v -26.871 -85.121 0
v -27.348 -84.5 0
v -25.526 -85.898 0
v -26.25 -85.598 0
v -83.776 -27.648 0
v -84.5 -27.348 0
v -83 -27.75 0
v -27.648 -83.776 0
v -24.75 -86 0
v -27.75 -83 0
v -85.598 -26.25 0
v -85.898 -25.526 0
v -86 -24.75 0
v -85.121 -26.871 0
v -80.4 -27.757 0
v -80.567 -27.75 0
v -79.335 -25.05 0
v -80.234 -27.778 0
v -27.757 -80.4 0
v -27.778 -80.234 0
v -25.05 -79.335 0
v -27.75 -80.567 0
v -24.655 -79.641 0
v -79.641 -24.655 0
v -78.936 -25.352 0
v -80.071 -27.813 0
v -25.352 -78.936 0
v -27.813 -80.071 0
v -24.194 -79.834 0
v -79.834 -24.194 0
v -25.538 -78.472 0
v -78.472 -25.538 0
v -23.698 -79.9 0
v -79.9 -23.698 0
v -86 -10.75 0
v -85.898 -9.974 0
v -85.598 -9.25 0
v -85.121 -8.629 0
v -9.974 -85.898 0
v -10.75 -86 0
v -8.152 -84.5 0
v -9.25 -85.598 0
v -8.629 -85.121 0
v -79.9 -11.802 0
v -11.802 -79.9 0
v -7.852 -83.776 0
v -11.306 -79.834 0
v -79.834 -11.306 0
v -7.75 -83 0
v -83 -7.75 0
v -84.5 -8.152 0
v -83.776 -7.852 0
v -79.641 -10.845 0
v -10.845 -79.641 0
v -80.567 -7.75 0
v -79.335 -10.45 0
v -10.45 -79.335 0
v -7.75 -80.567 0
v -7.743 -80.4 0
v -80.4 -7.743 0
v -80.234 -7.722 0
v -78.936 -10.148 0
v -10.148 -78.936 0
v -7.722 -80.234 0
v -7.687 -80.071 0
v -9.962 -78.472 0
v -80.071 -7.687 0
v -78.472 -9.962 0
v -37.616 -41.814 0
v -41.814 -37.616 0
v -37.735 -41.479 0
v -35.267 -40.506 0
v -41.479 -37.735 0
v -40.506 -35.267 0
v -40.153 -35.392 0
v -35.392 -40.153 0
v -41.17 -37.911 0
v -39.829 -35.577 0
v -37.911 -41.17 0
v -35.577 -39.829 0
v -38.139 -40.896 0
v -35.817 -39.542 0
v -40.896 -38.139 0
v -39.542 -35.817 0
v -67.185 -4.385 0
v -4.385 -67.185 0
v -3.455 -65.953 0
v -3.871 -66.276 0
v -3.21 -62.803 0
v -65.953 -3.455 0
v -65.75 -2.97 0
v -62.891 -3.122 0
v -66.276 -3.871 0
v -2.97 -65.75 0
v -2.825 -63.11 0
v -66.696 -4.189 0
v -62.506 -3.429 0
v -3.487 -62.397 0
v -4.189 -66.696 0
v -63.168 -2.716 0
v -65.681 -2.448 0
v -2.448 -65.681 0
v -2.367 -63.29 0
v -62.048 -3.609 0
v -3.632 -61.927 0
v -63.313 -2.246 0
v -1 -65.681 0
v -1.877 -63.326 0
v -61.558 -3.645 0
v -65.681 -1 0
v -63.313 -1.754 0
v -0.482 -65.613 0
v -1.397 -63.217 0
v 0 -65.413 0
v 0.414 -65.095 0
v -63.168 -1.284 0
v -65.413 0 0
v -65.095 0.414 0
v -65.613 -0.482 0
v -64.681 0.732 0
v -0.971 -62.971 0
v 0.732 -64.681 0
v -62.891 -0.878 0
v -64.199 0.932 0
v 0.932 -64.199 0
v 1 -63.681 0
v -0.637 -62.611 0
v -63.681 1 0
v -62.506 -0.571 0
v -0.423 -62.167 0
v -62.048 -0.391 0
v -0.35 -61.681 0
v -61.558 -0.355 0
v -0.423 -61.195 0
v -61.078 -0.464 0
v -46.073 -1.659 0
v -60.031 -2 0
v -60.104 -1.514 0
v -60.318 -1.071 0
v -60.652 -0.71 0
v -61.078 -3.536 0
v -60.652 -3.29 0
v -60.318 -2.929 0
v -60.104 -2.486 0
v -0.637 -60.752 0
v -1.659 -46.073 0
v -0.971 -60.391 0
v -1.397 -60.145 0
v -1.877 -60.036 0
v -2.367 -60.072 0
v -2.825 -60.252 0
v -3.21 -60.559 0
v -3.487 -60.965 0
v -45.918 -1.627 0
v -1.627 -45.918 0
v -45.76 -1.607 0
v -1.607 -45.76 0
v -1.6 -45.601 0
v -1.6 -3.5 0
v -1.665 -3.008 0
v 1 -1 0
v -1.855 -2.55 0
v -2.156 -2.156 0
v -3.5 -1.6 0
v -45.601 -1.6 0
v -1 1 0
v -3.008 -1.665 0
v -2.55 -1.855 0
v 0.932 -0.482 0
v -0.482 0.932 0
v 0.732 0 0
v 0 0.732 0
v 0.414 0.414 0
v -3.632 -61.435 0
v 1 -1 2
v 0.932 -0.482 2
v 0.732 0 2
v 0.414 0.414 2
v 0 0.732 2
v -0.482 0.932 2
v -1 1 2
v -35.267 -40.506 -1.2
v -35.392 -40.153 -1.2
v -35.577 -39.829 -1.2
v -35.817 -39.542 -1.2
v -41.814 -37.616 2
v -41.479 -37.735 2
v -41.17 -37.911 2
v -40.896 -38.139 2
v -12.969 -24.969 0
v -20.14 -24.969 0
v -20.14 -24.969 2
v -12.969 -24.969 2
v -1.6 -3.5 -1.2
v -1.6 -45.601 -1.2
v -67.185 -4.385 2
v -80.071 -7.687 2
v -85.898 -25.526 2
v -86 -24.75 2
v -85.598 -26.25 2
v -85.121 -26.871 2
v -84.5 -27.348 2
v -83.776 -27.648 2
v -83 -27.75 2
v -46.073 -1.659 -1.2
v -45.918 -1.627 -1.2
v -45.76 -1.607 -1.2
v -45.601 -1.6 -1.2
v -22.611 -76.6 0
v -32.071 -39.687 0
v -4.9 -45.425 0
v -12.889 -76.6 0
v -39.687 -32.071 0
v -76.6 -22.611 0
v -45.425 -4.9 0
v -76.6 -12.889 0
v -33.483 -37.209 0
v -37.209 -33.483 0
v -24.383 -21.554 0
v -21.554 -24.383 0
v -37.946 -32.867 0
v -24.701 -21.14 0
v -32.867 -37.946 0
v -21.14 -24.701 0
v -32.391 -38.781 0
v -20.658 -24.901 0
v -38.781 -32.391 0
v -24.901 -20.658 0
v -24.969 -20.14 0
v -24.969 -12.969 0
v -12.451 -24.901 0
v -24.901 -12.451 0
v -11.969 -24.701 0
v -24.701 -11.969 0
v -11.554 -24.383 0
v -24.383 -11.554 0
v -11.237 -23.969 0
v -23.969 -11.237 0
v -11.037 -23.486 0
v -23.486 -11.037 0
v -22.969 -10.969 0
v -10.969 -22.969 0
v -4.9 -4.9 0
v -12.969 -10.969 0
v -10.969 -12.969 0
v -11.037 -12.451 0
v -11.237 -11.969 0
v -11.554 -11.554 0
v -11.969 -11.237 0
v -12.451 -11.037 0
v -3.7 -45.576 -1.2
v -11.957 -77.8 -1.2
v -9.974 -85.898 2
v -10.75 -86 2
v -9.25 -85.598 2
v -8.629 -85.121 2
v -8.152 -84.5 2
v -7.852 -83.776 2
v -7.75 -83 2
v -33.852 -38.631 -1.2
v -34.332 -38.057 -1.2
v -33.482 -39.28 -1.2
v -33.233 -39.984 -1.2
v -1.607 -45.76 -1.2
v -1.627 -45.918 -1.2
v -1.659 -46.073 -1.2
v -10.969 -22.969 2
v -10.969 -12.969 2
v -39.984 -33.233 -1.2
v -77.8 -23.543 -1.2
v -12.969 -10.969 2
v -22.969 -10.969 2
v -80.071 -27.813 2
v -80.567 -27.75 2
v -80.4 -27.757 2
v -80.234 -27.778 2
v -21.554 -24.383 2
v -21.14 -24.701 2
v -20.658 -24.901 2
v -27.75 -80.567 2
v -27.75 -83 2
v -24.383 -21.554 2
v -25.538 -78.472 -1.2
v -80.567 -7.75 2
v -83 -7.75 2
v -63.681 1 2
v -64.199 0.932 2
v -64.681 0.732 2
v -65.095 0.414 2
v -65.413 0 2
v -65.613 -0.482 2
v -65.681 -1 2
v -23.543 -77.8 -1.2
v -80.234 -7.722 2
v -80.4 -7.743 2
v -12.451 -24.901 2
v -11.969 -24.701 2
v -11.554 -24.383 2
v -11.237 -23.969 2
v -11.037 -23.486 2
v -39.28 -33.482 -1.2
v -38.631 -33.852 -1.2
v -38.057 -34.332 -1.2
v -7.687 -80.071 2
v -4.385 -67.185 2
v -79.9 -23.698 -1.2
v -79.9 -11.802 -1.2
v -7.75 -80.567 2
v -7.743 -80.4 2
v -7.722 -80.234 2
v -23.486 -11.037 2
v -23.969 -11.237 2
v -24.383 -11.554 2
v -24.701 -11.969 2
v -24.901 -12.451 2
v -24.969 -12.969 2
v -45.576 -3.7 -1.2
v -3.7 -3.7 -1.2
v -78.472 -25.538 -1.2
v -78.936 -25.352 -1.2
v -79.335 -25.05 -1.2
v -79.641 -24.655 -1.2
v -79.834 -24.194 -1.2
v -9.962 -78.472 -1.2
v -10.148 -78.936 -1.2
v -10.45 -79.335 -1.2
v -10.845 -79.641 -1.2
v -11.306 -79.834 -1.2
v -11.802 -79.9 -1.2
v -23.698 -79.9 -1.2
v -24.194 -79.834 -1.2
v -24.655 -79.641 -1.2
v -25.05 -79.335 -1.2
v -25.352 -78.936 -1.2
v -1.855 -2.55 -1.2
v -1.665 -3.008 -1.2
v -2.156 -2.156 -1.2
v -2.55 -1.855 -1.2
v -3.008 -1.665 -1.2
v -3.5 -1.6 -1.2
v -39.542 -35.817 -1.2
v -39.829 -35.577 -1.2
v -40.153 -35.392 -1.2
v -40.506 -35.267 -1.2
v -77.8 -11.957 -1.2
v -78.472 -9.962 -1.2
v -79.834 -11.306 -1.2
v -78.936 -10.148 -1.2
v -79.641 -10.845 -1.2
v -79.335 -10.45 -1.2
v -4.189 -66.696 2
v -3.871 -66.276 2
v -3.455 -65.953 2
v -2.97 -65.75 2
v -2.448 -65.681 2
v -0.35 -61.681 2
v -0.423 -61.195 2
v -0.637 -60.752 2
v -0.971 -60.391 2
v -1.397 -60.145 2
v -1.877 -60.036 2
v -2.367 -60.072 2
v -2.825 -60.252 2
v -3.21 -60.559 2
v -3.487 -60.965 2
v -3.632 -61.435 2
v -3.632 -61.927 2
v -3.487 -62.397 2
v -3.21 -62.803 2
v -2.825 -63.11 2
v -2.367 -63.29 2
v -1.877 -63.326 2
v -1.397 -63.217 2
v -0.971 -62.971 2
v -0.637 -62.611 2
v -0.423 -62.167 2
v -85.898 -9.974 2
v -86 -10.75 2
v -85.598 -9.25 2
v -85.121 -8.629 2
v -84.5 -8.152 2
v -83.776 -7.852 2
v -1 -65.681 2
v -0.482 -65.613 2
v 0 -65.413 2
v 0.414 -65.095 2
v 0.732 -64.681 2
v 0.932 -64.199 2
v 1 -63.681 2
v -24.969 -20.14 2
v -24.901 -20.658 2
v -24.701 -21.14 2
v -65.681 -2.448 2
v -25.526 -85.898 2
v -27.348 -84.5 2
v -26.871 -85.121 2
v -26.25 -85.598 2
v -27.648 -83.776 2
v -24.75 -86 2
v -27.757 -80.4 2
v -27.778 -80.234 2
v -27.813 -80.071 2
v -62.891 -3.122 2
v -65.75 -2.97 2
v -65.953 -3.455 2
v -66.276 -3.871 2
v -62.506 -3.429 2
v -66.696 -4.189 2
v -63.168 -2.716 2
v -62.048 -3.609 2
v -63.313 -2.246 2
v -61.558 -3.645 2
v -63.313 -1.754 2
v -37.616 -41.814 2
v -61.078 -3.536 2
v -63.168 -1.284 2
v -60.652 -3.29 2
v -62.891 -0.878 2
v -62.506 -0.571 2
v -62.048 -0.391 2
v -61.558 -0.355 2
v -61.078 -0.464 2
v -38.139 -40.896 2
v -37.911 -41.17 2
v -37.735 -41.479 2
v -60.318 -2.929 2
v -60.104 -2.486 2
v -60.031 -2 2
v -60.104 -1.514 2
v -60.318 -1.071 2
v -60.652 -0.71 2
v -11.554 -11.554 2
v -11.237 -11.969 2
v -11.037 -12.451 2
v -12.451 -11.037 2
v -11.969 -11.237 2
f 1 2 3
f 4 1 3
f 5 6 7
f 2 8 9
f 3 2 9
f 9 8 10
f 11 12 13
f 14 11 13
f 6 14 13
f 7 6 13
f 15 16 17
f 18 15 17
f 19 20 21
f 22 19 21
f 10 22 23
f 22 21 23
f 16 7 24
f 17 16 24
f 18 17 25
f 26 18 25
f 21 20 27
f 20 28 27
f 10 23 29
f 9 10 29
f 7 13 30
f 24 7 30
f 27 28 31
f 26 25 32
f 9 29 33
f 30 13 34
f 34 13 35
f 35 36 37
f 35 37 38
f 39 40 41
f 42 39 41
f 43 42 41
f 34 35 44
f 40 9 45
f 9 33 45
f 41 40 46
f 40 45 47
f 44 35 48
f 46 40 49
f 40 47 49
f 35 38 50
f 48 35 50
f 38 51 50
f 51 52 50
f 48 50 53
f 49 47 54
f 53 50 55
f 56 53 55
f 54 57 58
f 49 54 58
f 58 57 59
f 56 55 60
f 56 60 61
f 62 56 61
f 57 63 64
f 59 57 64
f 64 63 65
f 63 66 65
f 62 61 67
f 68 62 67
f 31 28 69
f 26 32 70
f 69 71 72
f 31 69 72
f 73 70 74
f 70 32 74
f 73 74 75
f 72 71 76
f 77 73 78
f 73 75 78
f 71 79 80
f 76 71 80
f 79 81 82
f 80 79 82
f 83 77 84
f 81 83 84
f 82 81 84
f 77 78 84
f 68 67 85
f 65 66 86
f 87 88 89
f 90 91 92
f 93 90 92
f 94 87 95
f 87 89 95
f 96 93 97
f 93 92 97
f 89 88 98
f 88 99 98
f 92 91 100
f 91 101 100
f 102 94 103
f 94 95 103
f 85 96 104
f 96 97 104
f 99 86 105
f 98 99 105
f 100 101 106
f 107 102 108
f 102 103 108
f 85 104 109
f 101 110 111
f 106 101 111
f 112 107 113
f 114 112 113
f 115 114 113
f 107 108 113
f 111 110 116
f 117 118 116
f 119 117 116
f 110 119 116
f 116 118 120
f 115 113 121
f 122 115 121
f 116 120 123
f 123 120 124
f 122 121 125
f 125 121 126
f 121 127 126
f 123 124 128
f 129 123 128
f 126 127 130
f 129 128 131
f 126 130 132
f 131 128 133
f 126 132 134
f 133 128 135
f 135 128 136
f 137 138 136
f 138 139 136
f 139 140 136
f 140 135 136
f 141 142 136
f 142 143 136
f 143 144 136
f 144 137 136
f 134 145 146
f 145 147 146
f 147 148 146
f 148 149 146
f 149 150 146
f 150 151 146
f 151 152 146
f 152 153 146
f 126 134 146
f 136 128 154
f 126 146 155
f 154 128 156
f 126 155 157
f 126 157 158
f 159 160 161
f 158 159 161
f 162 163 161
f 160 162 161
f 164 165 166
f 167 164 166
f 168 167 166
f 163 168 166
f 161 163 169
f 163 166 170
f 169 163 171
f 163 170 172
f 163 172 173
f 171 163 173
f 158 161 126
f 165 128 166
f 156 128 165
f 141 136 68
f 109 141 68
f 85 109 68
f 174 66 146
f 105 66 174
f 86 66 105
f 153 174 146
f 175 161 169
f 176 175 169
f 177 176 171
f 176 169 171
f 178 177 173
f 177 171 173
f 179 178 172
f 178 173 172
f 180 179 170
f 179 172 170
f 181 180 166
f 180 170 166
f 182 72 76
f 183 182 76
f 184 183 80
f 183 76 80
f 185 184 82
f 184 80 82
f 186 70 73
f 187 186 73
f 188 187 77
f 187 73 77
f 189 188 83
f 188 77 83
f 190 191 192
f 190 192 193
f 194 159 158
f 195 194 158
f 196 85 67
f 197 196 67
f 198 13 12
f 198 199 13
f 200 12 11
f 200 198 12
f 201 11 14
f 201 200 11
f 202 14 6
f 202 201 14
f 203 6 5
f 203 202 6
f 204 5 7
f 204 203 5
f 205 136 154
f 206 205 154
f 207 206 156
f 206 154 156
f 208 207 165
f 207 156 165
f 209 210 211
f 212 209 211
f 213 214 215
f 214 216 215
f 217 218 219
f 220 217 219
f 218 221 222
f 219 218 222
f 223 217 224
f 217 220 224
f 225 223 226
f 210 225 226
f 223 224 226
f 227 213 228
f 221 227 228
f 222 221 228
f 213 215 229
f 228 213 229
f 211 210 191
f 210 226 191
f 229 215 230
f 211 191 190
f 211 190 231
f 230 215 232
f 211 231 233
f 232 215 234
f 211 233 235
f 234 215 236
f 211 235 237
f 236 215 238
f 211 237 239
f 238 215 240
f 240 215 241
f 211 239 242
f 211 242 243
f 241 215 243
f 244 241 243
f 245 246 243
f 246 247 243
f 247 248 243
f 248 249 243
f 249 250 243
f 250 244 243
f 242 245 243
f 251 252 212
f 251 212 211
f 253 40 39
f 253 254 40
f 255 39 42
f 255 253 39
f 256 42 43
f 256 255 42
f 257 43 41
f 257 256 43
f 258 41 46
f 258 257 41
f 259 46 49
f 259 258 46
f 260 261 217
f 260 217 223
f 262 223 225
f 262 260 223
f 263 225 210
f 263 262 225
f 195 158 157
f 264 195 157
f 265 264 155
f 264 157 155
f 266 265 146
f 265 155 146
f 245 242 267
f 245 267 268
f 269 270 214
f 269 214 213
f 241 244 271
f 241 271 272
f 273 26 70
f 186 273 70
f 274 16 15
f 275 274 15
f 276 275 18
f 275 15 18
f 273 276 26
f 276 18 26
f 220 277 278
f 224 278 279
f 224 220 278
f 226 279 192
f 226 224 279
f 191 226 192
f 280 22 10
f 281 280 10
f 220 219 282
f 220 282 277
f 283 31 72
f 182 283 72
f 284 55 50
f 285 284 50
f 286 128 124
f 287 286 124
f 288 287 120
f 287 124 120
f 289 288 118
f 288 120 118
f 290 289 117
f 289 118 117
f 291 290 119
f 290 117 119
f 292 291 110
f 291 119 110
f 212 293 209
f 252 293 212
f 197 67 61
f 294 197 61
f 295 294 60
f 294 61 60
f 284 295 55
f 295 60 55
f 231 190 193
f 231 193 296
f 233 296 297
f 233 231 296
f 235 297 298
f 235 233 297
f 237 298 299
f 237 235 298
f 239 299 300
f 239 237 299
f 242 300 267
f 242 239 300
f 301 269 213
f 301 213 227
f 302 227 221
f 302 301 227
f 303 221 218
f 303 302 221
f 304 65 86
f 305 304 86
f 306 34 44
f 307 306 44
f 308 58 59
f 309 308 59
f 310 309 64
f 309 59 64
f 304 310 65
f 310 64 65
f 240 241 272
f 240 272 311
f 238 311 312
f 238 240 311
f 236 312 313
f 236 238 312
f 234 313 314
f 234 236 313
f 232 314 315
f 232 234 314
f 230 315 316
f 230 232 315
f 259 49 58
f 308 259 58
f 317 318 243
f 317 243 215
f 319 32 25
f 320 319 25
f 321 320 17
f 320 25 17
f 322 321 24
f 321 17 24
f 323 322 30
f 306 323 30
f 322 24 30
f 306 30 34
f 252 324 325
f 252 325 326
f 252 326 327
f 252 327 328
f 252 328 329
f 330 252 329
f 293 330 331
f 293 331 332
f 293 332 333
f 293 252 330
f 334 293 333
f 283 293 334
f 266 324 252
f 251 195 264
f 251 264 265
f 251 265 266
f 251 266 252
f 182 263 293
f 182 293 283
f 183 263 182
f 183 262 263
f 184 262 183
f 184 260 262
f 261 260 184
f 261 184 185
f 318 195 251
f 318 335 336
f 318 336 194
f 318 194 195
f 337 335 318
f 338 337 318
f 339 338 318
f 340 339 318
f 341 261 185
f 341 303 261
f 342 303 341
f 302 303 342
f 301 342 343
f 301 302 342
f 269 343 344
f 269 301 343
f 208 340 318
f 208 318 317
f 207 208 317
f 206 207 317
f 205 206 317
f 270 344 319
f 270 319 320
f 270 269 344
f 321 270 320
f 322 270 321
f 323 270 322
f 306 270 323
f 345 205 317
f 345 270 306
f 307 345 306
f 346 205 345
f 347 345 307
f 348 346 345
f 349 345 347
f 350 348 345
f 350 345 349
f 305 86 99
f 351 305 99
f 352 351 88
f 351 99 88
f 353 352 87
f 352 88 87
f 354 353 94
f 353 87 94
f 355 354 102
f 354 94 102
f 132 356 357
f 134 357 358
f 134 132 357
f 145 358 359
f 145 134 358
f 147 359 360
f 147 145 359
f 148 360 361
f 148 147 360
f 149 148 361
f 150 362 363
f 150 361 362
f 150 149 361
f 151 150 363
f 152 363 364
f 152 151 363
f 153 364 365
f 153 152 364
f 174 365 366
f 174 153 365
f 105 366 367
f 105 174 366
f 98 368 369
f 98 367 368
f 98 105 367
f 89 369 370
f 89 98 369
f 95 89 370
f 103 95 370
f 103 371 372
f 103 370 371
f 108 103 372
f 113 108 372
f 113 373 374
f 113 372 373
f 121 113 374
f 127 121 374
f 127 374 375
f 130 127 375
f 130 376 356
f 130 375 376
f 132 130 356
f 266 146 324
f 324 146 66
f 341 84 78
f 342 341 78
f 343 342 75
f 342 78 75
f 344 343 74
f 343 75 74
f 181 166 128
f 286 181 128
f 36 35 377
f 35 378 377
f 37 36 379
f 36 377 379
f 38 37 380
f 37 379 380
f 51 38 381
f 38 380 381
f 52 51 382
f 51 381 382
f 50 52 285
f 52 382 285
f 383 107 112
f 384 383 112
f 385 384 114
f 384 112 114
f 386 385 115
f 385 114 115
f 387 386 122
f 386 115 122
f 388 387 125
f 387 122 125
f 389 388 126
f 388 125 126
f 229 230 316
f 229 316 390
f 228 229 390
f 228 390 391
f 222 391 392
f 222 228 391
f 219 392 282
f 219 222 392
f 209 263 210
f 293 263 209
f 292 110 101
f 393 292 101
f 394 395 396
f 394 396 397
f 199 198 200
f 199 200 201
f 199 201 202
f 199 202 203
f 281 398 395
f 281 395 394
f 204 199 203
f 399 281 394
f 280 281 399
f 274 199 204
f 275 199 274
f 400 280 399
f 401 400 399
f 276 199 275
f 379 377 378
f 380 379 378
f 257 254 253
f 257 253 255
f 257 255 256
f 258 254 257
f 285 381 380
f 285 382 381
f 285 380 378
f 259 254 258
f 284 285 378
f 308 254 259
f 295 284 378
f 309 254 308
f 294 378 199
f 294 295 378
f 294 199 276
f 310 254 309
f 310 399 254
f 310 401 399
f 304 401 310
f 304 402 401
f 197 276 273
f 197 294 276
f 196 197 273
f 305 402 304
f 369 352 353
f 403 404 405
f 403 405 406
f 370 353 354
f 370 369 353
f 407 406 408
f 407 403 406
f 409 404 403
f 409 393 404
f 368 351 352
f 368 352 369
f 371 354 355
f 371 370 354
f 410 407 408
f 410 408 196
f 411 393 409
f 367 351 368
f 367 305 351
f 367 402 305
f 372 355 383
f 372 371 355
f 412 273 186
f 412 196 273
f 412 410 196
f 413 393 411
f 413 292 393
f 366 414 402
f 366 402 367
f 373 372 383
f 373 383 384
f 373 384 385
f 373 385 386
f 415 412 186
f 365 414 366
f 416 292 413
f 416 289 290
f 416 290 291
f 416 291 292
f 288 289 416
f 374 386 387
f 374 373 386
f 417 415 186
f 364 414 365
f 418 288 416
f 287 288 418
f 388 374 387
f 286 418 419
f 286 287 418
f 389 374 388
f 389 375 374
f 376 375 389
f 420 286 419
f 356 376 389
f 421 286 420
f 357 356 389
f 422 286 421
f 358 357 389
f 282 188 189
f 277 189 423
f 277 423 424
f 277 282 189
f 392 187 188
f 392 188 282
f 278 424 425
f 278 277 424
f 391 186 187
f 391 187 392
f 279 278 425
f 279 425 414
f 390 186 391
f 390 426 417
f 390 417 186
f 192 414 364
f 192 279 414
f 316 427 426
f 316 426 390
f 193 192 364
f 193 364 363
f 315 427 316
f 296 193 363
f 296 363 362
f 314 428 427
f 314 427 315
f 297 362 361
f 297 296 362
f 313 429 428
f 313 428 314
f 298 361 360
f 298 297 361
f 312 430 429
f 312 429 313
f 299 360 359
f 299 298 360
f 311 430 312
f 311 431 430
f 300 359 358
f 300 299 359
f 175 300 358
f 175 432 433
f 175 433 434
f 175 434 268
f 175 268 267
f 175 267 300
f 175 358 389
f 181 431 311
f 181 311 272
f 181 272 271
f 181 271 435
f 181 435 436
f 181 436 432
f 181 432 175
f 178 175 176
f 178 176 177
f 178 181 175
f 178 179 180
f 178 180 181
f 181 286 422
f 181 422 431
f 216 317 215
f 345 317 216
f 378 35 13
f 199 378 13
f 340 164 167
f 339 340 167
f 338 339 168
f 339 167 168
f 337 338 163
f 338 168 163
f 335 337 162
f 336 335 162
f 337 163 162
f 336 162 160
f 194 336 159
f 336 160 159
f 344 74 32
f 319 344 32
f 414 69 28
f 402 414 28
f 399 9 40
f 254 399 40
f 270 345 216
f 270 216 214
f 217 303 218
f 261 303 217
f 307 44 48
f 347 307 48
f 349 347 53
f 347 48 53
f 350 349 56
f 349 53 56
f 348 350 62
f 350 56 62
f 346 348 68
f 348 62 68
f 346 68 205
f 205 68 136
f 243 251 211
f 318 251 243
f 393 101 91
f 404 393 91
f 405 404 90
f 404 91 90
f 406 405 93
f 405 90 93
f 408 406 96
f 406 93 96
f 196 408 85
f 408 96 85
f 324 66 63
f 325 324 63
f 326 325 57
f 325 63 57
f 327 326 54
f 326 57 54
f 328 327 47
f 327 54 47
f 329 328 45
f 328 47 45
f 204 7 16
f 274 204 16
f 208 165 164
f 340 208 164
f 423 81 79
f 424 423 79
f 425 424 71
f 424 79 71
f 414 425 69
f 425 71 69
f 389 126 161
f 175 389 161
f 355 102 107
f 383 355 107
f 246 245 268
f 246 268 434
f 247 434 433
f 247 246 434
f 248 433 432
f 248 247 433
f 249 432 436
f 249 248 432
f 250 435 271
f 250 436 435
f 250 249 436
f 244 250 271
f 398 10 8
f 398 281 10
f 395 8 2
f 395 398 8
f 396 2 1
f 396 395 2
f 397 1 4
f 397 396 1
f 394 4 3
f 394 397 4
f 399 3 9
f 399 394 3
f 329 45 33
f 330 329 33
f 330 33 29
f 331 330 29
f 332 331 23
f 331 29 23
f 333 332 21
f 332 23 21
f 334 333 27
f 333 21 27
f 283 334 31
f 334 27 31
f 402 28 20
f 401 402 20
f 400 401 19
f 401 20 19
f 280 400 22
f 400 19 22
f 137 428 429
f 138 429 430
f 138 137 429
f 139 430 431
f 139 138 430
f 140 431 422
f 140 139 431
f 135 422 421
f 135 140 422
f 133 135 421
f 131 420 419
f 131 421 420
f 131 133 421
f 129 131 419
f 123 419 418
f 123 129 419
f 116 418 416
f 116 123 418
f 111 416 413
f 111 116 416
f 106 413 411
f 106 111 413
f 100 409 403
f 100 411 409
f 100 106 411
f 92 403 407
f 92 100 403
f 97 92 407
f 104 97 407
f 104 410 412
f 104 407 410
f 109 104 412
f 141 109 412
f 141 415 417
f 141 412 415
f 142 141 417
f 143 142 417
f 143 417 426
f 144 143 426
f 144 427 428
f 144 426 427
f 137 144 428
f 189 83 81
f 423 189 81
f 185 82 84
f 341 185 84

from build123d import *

# Parameters (mm, degrees)
BOSS_EXTRUDE1_DEPTH = 2
CUT_EXTRUDE2_DEPTH  = 122.638809596
BOSS_EXTRUDE2_DEPTH = 1.2
CHAMFER1_SIZE       = 1.2
SKETCH2_R           = 1.65
CUT_EXTRUDE3_DEPTH  = 122.638809596
FILLET1_R           = 3


with BuildPart() as part:
    # Sketch1 → Boss-Extrude1 (new body)
    with BuildSketch(Plane.XY):
        with BuildLine():
            Line((-86, -7.75), (-86, -27.75))
            Line((-86, -27.75), (-80.567396197, -27.75))
            ThreePointArc((-80.567396197, -27.75), (-80.317201092, -27.765711107), (-80.07093683, -27.81259759))
            Line((-80.07093683, -27.81259759), (-41.814217278, -37.615881976))
            ThreePointArc((-41.814217278, -37.615881976), (-41.320172025, -37.815786012), (-40.896463083, -38.139070823))
            Line((-40.896463083, -38.139070823), (-38.139070823, -40.896463083))
            ThreePointArc((-38.139070823, -40.896463083), (-37.815786012, -41.320172025), (-37.615881976, -41.814217278))
            Line((-37.615881976, -41.814217278), (-27.81259759, -80.07093683))
            ThreePointArc((-27.81259759, -80.07093683), (-27.765711107, -80.317201092), (-27.75, -80.567396197))
            Line((-27.75, -80.567396197), (-27.75, -86))
            Line((-27.75, -86), (-7.75, -86))
            Line((-7.75, -86), (-7.75, -80.567396197))
            ThreePointArc((-7.75, -80.567396197), (-7.734288893, -80.317201092), (-7.68740241, -80.07093683))
            Line((-7.68740241, -80.07093683), (-4.385282287, -67.184614401))
            ThreePointArc((-4.385282287, -67.184614401), (-3.674069354, -66.101054981), (-2.447879878, -65.681073768))
            Line((-2.447879878, -65.681073768), (-1, -65.681073768))
            ThreePointArc((-1, -65.681073768), (0.414213562, -65.09528733), (1, -63.681073768))
            Line((1, -63.681073768), (1, -1))
            ThreePointArc((1, -1), (0.414213562, 0.414213562), (-1, 1))
            Line((-1, 1), (-63.681073768, 1))
            ThreePointArc((-63.681073768, 1), (-65.09528733, 0.414213562), (-65.681073768, -1))
            Line((-65.681073768, -1), (-65.681073768, -2.447879878))
            ThreePointArc((-65.681073768, -2.447879878), (-66.101054981, -3.674069354), (-67.184614401, -4.385282287))
            Line((-67.184614401, -4.385282287), (-80.07093683, -7.68740241))
            ThreePointArc((-80.07093683, -7.68740241), (-80.317201092, -7.734288893), (-80.567396197, -7.75))
            Line((-80.567396197, -7.75), (-86, -7.75))
        make_face()
    extrude(amount=BOSS_EXTRUDE1_DEPTH)

    # Sketch4 → Cut-Extrude2 (cut, through all)
    with BuildSketch(Plane.XY):
        with BuildLine():
            Line((-24.968684618, -12.968684618), (-24.968684618, -20.140257493))
            ThreePointArc((-24.968684618, -20.140257493), (-24.816443683, -20.905624358), (-24.38289818, -21.554471055))
            Line((-24.38289818, -21.554471055), (-21.554471055, -24.38289818))
            ThreePointArc((-21.554471055, -24.38289818), (-20.905624358, -24.816443683), (-20.140257493, -24.968684618))
            Line((-20.140257493, -24.968684618), (-12.968684618, -24.968684618))
            ThreePointArc((-12.968684618, -24.968684618), (-11.554471055, -24.38289818), (-10.968684618, -22.968684618))
            Line((-10.968684618, -22.968684618), (-10.968684618, -12.968684618))
            ThreePointArc((-10.968684618, -12.968684618), (-11.554471055, -11.554471055), (-12.968684618, -10.968684618))
            Line((-12.968684618, -10.968684618), (-22.968684618, -10.968684618))
            ThreePointArc((-22.968684618, -10.968684618), (-24.38289818, -11.554471055), (-24.968684618, -12.968684618))
        make_face()
    extrude(amount=CUT_EXTRUDE2_DEPTH, mode=Mode.SUBTRACT)

    # Sketch5 → Boss-Extrude2 (add)
    with BuildSketch(Plane.XY):
        with BuildLine():
            Line((-78.471636399, -9.961587833), (-46.073118848, -1.659467711))
            ThreePointArc((-46.073118848, -1.659467711), (-45.839167799, -1.614925552), (-45.601482449, -1.6))
            Line((-45.601482449, -1.6), (-3.5, -1.6))
            ThreePointArc((-3.5, -1.6), (-2.156497116, -2.156497116), (-1.6, -3.5))
            Line((-1.6, -3.5), (-1.6, -45.601482449))
            ThreePointArc((-1.6, -45.601482449), (-1.614925552, -45.839167799), (-1.659467711, -46.073118848))
            Line((-1.659467711, -46.073118848), (-9.961587833, -78.471636399))
            ThreePointArc((-9.961587833, -78.471636399), (-10.63724012, -79.501017848), (-11.802120122, -79.9))
            Line((-11.802120122, -79.9), (-23.697879878, -79.9))
            ThreePointArc((-23.697879878, -79.9), (-24.86275988, -79.501017848), (-25.538412167, -78.471636399))
            Line((-25.538412167, -78.471636399), (-35.267187197, -40.505685062))
            ThreePointArc((-35.267187197, -40.505685062), (-35.477086435, -39.986937546), (-35.816535486, -39.542043158))
            Line((-35.816535486, -39.542043158), (-39.542043158, -35.816535486))
            ThreePointArc((-39.542043158, -35.816535486), (-39.986937546, -35.477086435), (-40.505685062, -35.267187197))
            Line((-40.505685062, -35.267187197), (-78.471636399, -25.538412167))
            ThreePointArc((-78.471636399, -25.538412167), (-79.501017848, -24.86275988), (-79.9, -23.697879877))
            Line((-79.9, -23.697879877), (-79.9, -11.802120122))
            ThreePointArc((-79.9, -11.802120122), (-79.501017848, -10.63724012), (-78.471636399, -9.961587833))
        make_face()
        with BuildLine():
            Line((-77.8, -11.957332135), (-77.8, -23.542667865))
            Line((-77.8, -23.542667865), (-39.984402726, -33.232914667))
            ThreePointArc((-39.984402726, -33.232914667), (-38.946907695, -33.652713143), (-38.057118917, -34.331611246))
            Line((-38.057118917, -34.331611246), (-34.331611246, -38.057118917))
            ThreePointArc((-34.331611246, -38.057118917), (-33.652713143, -38.946907695), (-33.232914667, -39.984402726))
            Line((-33.232914667, -39.984402726), (-23.542667865, -77.8))
            Line((-23.542667865, -77.8), (-11.957332135, -77.8))
            Line((-11.957332135, -77.8), (-3.7, -45.57626484))
            Line((-3.7, -45.57626484), (-3.7, -3.7))
            Line((-3.7, -3.7), (-45.57626484, -3.7))
            Line((-45.57626484, -3.7), (-77.8, -11.957332135))
        make_face(mode=Mode.SUBTRACT)
    extrude(amount=-BOSS_EXTRUDE2_DEPTH)

    # Chamfer1
    chamfer1_edges = [part.edges().sort_by_distance(p)[0] for p in [
        (-28.387791266, -58.892201363, 0),
        (-33.652713143, -38.946907695, 0),
        (-36.194365081, -36.194365081, 0),
        (-38.946907695, -33.652713143, 0),
        (-17.75, -77.8, 0),
        (-7.828666067, -61.68813242, 0),
        (-3.7, -24.63813242, 0),
        (-24.63813242, -3.7, 0),
        (-61.68813242, -7.828666067, 0),
        (-77.8, -17.75, 0),
        (-58.892201363, -28.387791266, 0),
    ]]
    chamfer(chamfer1_edges, length=CHAMFER1_SIZE - 0.0001)  # a hair under: the kernel refuses the full size

    # Sketch2 → Cut-Extrude3 (cut, through all)
    with BuildSketch(Plane.XY):
        with Locations((-61.681073768, -2)):
            Circle(SKETCH2_R)
        with Locations((-2, -61.681073768)):
            Circle(SKETCH2_R)
    extrude(amount=CUT_EXTRUDE3_DEPTH, mode=Mode.SUBTRACT)

    # Fillet1
    fillet1_edges = [part.edges().sort_by_distance(p)[0] for p in [
        (-7.75, -86, 1),
        (-27.75, -86, 1),
        (-86, -27.75, 1),
        (-86, -7.75, 1),
    ]]
    fillet(fillet1_edges, radius=FILLET1_R)


solid = part.part
